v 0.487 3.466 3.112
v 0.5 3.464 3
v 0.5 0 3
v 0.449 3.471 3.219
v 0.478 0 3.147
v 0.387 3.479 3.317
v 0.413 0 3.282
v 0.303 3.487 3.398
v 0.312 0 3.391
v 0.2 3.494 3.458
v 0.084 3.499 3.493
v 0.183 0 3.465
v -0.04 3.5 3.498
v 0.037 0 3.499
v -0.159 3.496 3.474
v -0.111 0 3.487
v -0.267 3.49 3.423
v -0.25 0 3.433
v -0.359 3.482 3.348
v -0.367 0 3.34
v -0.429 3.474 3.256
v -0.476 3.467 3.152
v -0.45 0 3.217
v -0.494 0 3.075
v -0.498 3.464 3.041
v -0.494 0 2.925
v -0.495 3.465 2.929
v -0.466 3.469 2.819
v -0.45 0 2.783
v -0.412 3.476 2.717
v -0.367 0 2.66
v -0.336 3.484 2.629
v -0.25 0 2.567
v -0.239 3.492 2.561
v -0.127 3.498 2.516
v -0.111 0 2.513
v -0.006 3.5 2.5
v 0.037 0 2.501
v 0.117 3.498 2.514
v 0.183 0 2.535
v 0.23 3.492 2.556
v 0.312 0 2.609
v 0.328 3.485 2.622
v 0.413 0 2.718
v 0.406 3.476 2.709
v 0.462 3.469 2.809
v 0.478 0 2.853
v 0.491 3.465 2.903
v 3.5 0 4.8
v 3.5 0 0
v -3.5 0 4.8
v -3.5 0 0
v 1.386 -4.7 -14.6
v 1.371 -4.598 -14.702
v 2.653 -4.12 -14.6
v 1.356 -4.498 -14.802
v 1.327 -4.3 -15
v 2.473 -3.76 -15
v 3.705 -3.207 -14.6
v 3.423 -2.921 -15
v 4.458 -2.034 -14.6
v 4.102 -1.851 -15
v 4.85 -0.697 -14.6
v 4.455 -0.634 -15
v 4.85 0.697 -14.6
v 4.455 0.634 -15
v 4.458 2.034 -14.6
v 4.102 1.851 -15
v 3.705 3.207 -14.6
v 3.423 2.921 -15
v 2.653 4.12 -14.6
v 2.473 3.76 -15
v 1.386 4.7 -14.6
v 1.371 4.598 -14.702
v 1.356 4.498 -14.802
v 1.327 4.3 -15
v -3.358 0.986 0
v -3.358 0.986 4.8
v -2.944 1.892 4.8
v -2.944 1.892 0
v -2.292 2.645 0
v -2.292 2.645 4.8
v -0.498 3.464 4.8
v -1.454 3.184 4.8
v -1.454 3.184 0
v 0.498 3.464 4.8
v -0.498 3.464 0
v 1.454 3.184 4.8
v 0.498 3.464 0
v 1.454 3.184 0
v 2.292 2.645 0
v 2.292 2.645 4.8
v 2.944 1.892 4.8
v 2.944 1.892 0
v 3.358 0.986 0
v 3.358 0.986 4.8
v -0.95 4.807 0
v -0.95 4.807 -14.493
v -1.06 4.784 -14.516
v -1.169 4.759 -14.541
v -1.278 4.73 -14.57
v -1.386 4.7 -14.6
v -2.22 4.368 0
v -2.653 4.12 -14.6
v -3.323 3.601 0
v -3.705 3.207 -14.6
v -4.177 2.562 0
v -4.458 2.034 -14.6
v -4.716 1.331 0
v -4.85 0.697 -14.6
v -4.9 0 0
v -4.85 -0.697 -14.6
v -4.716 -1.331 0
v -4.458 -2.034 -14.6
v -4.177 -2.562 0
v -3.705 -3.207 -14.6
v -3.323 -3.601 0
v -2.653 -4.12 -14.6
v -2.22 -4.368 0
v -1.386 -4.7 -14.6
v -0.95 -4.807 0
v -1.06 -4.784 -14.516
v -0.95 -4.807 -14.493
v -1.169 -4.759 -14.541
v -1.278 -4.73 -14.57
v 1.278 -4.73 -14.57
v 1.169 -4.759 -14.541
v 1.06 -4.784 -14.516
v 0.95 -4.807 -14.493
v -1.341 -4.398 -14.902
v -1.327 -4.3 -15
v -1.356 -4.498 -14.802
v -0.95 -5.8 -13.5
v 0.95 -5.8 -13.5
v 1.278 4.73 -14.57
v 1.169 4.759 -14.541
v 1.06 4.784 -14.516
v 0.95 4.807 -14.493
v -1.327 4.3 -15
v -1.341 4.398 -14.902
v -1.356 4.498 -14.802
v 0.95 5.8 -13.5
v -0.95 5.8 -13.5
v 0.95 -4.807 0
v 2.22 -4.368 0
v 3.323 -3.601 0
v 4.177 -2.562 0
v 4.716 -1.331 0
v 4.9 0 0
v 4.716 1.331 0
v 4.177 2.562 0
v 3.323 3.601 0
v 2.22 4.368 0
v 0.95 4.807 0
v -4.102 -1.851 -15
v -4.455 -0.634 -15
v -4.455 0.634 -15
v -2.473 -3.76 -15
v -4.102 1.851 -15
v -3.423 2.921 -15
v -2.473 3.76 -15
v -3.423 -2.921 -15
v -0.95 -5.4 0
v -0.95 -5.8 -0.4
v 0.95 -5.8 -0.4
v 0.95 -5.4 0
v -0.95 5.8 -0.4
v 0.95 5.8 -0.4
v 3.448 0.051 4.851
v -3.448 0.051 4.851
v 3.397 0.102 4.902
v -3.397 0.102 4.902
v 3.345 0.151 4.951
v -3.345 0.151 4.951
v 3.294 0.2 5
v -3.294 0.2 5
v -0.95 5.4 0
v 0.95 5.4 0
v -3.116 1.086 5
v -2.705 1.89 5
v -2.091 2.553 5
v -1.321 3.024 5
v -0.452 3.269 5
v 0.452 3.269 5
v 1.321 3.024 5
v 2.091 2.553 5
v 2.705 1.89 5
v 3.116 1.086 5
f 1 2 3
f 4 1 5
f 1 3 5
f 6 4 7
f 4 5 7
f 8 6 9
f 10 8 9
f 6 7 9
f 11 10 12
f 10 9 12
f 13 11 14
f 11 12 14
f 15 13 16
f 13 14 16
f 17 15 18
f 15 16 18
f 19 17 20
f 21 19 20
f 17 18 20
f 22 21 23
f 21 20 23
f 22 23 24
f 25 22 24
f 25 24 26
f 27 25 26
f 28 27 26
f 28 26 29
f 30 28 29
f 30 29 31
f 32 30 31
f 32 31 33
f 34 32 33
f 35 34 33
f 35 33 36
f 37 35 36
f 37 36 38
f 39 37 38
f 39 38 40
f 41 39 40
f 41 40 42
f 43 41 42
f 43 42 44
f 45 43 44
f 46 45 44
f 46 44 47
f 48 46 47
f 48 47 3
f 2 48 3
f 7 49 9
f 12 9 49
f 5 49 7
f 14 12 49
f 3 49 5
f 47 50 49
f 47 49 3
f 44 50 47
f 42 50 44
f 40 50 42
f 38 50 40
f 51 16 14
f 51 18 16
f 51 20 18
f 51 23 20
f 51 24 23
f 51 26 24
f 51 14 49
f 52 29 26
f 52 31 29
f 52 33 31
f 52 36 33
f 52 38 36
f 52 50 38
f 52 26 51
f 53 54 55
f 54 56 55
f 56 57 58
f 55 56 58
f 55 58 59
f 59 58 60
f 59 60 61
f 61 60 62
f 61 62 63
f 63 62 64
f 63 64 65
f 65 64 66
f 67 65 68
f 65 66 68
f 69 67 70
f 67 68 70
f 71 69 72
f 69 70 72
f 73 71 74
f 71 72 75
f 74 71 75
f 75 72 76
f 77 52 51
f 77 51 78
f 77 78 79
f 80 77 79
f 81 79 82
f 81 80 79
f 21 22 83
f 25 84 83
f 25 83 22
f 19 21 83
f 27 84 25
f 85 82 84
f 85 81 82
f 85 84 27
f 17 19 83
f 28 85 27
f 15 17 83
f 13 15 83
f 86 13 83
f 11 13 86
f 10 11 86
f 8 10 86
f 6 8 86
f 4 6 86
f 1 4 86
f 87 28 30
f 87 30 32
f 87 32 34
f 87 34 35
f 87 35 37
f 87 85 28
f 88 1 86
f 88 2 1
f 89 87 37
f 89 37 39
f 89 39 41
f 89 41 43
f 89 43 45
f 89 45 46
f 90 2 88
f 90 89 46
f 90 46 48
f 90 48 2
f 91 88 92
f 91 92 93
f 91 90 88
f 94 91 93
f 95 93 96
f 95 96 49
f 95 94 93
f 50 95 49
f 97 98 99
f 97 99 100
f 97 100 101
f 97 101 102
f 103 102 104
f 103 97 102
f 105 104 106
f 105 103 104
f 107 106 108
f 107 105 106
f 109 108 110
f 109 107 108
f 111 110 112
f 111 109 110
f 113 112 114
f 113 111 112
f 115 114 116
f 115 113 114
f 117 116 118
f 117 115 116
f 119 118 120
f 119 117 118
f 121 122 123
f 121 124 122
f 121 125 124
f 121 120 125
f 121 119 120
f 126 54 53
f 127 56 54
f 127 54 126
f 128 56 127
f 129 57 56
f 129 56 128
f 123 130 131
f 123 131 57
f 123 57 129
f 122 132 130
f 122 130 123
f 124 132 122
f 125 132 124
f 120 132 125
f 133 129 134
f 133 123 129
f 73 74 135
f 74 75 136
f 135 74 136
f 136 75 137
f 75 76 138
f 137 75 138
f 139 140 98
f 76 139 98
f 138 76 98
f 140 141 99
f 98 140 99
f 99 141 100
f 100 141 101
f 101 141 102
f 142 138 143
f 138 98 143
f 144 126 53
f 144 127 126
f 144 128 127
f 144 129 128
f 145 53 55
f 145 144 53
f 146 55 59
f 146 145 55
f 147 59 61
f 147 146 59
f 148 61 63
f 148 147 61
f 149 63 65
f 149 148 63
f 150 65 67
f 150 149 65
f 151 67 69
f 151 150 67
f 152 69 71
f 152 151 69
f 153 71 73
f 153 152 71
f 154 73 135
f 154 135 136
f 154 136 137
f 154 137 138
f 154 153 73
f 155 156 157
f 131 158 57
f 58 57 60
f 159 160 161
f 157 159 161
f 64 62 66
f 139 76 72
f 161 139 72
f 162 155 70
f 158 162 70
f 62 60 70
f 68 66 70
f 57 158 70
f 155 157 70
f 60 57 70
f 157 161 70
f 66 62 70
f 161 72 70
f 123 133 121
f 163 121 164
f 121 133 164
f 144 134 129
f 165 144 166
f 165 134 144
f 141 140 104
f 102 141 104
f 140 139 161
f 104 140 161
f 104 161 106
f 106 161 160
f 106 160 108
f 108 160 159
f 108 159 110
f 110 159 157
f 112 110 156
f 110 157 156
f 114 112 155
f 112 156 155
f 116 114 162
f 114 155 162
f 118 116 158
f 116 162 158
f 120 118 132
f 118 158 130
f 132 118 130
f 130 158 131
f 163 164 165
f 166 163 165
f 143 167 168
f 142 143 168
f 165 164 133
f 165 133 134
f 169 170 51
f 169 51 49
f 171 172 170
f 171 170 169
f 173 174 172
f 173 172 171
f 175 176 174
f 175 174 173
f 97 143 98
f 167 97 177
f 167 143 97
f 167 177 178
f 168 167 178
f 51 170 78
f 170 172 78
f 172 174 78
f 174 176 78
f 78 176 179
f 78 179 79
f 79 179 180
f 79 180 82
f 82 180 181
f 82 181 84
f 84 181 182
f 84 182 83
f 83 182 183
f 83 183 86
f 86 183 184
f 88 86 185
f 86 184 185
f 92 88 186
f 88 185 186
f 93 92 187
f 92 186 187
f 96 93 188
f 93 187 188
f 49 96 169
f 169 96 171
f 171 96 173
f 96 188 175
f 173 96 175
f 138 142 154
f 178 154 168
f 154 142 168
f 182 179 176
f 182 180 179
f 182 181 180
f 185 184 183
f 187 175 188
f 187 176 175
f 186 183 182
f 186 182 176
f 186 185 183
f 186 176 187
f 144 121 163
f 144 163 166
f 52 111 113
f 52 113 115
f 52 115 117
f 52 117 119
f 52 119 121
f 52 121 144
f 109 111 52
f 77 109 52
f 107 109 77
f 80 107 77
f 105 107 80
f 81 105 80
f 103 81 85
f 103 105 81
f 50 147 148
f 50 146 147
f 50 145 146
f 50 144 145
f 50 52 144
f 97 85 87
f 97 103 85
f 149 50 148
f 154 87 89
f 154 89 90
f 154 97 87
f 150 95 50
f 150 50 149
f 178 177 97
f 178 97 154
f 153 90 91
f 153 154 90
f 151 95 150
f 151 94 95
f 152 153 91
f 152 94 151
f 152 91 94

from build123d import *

# Parameters (mm, degrees)
F1_R          = 4.9
F2_DEPTH      = 5
F2_DEPTH_BACK = 15
F5_W          = 1.9
F5_H          = 15
F3_R          = 4.9
F7_DEPTH      = 5.001
F8_R          = 0.5
F9_DEPTH      = 5.801
F10_SIZE      = 0.2
F11_SIZE      = 0.4
F12_T1_DEPTH  = 9.6150489639
F13_SIZE      = 0.4


# Not quite as in the source:
# - a fillet or chamfer that OpenCascade refuses, or shapes differently, is made with other operations: its cross-section is extruded or revolved along the edge and cut away or added
# - a pattern or mirror of a feature is missing from the dataset's text; its kind, count and spacing are read off the source's solid


with BuildPart() as f2:
    # F1 (on Top) → F2 (new body, two sides)
    with BuildSketch(Plane.XY) as f2_sk:
        Circle(F1_R)
    extrude(amount=F2_DEPTH)
    extrude(f2_sk.sketch, amount=-F2_DEPTH_BACK)

    # F5 (on offset) → F6 (join, up to the next surface of F2)
    with BuildSketch(Plane.XZ.offset(-5.8)):
        with Locations((0, -7.5)):
            Rectangle(F5_W, F5_H)
    f6 = extrude(until=Until.NEXT)

    # F6_copies: F6 across plane
    add(f6.mirror(Plane(origin=(0, 0, 0), x_dir=(0, 0, -1), z_dir=(0, -1, 0))))

    # F3 (on Top) → F7 (cut, through all)
    with BuildSketch(Plane.XY):
        Circle(F3_R)
        with BuildLine():
            ThreePointArc((-3.5, 0), (0, 3.5), (3.5, 0))
            Line((3.5, 0), (-3.5, 0))
        make_face(mode=Mode.SUBTRACT)
    extrude(amount=F7_DEPTH, mode=Mode.SUBTRACT)

    # F8 (on face) → F9 (cut, through all)
    with BuildSketch(Plane.XZ):
        with Locations((0, 3)):
            Circle(F8_R)
    extrude(amount=-F9_DEPTH, mode=Mode.SUBTRACT)

    # F10
    f10_edges = [f2.edges().sort_by_distance(p)[0] for p in [
        (0, 3.5, 5),
        (0, 0, 5),
    ]]
    chamfer(f10_edges, length=F10_SIZE)

    # F11
    f11_edges = [f2.edges().sort_by_distance(p)[0] for p in [
        (-4.9, 0, -15),
    ]]
    chamfer(f11_edges, length=F11_SIZE)

    # F12: chamfer of 1.5 on 2 edges, made by hand

    # F12_s2 → F12_t1 (cut)
    with BuildSketch(Plane.YZ.offset(-4.8075244819)):
        Polygon((4.3, -15), (5.8, -13.5), (5.8, -15), align=None)
        Polygon((-4.3, -15), (-5.8, -13.5), (-5.8, -15), align=None)
    extrude(amount=F12_T1_DEPTH, mode=Mode.SUBTRACT)

    # F13
    f13_edges = [f2.edges().sort_by_distance(p)[0] for p in [
        (0, 5.8, 0),
        (0, -5.8, 0),
        (4.9, 0, -15),
    ]]
    chamfer(f13_edges, length=F13_SIZE)


solid = f2.part
